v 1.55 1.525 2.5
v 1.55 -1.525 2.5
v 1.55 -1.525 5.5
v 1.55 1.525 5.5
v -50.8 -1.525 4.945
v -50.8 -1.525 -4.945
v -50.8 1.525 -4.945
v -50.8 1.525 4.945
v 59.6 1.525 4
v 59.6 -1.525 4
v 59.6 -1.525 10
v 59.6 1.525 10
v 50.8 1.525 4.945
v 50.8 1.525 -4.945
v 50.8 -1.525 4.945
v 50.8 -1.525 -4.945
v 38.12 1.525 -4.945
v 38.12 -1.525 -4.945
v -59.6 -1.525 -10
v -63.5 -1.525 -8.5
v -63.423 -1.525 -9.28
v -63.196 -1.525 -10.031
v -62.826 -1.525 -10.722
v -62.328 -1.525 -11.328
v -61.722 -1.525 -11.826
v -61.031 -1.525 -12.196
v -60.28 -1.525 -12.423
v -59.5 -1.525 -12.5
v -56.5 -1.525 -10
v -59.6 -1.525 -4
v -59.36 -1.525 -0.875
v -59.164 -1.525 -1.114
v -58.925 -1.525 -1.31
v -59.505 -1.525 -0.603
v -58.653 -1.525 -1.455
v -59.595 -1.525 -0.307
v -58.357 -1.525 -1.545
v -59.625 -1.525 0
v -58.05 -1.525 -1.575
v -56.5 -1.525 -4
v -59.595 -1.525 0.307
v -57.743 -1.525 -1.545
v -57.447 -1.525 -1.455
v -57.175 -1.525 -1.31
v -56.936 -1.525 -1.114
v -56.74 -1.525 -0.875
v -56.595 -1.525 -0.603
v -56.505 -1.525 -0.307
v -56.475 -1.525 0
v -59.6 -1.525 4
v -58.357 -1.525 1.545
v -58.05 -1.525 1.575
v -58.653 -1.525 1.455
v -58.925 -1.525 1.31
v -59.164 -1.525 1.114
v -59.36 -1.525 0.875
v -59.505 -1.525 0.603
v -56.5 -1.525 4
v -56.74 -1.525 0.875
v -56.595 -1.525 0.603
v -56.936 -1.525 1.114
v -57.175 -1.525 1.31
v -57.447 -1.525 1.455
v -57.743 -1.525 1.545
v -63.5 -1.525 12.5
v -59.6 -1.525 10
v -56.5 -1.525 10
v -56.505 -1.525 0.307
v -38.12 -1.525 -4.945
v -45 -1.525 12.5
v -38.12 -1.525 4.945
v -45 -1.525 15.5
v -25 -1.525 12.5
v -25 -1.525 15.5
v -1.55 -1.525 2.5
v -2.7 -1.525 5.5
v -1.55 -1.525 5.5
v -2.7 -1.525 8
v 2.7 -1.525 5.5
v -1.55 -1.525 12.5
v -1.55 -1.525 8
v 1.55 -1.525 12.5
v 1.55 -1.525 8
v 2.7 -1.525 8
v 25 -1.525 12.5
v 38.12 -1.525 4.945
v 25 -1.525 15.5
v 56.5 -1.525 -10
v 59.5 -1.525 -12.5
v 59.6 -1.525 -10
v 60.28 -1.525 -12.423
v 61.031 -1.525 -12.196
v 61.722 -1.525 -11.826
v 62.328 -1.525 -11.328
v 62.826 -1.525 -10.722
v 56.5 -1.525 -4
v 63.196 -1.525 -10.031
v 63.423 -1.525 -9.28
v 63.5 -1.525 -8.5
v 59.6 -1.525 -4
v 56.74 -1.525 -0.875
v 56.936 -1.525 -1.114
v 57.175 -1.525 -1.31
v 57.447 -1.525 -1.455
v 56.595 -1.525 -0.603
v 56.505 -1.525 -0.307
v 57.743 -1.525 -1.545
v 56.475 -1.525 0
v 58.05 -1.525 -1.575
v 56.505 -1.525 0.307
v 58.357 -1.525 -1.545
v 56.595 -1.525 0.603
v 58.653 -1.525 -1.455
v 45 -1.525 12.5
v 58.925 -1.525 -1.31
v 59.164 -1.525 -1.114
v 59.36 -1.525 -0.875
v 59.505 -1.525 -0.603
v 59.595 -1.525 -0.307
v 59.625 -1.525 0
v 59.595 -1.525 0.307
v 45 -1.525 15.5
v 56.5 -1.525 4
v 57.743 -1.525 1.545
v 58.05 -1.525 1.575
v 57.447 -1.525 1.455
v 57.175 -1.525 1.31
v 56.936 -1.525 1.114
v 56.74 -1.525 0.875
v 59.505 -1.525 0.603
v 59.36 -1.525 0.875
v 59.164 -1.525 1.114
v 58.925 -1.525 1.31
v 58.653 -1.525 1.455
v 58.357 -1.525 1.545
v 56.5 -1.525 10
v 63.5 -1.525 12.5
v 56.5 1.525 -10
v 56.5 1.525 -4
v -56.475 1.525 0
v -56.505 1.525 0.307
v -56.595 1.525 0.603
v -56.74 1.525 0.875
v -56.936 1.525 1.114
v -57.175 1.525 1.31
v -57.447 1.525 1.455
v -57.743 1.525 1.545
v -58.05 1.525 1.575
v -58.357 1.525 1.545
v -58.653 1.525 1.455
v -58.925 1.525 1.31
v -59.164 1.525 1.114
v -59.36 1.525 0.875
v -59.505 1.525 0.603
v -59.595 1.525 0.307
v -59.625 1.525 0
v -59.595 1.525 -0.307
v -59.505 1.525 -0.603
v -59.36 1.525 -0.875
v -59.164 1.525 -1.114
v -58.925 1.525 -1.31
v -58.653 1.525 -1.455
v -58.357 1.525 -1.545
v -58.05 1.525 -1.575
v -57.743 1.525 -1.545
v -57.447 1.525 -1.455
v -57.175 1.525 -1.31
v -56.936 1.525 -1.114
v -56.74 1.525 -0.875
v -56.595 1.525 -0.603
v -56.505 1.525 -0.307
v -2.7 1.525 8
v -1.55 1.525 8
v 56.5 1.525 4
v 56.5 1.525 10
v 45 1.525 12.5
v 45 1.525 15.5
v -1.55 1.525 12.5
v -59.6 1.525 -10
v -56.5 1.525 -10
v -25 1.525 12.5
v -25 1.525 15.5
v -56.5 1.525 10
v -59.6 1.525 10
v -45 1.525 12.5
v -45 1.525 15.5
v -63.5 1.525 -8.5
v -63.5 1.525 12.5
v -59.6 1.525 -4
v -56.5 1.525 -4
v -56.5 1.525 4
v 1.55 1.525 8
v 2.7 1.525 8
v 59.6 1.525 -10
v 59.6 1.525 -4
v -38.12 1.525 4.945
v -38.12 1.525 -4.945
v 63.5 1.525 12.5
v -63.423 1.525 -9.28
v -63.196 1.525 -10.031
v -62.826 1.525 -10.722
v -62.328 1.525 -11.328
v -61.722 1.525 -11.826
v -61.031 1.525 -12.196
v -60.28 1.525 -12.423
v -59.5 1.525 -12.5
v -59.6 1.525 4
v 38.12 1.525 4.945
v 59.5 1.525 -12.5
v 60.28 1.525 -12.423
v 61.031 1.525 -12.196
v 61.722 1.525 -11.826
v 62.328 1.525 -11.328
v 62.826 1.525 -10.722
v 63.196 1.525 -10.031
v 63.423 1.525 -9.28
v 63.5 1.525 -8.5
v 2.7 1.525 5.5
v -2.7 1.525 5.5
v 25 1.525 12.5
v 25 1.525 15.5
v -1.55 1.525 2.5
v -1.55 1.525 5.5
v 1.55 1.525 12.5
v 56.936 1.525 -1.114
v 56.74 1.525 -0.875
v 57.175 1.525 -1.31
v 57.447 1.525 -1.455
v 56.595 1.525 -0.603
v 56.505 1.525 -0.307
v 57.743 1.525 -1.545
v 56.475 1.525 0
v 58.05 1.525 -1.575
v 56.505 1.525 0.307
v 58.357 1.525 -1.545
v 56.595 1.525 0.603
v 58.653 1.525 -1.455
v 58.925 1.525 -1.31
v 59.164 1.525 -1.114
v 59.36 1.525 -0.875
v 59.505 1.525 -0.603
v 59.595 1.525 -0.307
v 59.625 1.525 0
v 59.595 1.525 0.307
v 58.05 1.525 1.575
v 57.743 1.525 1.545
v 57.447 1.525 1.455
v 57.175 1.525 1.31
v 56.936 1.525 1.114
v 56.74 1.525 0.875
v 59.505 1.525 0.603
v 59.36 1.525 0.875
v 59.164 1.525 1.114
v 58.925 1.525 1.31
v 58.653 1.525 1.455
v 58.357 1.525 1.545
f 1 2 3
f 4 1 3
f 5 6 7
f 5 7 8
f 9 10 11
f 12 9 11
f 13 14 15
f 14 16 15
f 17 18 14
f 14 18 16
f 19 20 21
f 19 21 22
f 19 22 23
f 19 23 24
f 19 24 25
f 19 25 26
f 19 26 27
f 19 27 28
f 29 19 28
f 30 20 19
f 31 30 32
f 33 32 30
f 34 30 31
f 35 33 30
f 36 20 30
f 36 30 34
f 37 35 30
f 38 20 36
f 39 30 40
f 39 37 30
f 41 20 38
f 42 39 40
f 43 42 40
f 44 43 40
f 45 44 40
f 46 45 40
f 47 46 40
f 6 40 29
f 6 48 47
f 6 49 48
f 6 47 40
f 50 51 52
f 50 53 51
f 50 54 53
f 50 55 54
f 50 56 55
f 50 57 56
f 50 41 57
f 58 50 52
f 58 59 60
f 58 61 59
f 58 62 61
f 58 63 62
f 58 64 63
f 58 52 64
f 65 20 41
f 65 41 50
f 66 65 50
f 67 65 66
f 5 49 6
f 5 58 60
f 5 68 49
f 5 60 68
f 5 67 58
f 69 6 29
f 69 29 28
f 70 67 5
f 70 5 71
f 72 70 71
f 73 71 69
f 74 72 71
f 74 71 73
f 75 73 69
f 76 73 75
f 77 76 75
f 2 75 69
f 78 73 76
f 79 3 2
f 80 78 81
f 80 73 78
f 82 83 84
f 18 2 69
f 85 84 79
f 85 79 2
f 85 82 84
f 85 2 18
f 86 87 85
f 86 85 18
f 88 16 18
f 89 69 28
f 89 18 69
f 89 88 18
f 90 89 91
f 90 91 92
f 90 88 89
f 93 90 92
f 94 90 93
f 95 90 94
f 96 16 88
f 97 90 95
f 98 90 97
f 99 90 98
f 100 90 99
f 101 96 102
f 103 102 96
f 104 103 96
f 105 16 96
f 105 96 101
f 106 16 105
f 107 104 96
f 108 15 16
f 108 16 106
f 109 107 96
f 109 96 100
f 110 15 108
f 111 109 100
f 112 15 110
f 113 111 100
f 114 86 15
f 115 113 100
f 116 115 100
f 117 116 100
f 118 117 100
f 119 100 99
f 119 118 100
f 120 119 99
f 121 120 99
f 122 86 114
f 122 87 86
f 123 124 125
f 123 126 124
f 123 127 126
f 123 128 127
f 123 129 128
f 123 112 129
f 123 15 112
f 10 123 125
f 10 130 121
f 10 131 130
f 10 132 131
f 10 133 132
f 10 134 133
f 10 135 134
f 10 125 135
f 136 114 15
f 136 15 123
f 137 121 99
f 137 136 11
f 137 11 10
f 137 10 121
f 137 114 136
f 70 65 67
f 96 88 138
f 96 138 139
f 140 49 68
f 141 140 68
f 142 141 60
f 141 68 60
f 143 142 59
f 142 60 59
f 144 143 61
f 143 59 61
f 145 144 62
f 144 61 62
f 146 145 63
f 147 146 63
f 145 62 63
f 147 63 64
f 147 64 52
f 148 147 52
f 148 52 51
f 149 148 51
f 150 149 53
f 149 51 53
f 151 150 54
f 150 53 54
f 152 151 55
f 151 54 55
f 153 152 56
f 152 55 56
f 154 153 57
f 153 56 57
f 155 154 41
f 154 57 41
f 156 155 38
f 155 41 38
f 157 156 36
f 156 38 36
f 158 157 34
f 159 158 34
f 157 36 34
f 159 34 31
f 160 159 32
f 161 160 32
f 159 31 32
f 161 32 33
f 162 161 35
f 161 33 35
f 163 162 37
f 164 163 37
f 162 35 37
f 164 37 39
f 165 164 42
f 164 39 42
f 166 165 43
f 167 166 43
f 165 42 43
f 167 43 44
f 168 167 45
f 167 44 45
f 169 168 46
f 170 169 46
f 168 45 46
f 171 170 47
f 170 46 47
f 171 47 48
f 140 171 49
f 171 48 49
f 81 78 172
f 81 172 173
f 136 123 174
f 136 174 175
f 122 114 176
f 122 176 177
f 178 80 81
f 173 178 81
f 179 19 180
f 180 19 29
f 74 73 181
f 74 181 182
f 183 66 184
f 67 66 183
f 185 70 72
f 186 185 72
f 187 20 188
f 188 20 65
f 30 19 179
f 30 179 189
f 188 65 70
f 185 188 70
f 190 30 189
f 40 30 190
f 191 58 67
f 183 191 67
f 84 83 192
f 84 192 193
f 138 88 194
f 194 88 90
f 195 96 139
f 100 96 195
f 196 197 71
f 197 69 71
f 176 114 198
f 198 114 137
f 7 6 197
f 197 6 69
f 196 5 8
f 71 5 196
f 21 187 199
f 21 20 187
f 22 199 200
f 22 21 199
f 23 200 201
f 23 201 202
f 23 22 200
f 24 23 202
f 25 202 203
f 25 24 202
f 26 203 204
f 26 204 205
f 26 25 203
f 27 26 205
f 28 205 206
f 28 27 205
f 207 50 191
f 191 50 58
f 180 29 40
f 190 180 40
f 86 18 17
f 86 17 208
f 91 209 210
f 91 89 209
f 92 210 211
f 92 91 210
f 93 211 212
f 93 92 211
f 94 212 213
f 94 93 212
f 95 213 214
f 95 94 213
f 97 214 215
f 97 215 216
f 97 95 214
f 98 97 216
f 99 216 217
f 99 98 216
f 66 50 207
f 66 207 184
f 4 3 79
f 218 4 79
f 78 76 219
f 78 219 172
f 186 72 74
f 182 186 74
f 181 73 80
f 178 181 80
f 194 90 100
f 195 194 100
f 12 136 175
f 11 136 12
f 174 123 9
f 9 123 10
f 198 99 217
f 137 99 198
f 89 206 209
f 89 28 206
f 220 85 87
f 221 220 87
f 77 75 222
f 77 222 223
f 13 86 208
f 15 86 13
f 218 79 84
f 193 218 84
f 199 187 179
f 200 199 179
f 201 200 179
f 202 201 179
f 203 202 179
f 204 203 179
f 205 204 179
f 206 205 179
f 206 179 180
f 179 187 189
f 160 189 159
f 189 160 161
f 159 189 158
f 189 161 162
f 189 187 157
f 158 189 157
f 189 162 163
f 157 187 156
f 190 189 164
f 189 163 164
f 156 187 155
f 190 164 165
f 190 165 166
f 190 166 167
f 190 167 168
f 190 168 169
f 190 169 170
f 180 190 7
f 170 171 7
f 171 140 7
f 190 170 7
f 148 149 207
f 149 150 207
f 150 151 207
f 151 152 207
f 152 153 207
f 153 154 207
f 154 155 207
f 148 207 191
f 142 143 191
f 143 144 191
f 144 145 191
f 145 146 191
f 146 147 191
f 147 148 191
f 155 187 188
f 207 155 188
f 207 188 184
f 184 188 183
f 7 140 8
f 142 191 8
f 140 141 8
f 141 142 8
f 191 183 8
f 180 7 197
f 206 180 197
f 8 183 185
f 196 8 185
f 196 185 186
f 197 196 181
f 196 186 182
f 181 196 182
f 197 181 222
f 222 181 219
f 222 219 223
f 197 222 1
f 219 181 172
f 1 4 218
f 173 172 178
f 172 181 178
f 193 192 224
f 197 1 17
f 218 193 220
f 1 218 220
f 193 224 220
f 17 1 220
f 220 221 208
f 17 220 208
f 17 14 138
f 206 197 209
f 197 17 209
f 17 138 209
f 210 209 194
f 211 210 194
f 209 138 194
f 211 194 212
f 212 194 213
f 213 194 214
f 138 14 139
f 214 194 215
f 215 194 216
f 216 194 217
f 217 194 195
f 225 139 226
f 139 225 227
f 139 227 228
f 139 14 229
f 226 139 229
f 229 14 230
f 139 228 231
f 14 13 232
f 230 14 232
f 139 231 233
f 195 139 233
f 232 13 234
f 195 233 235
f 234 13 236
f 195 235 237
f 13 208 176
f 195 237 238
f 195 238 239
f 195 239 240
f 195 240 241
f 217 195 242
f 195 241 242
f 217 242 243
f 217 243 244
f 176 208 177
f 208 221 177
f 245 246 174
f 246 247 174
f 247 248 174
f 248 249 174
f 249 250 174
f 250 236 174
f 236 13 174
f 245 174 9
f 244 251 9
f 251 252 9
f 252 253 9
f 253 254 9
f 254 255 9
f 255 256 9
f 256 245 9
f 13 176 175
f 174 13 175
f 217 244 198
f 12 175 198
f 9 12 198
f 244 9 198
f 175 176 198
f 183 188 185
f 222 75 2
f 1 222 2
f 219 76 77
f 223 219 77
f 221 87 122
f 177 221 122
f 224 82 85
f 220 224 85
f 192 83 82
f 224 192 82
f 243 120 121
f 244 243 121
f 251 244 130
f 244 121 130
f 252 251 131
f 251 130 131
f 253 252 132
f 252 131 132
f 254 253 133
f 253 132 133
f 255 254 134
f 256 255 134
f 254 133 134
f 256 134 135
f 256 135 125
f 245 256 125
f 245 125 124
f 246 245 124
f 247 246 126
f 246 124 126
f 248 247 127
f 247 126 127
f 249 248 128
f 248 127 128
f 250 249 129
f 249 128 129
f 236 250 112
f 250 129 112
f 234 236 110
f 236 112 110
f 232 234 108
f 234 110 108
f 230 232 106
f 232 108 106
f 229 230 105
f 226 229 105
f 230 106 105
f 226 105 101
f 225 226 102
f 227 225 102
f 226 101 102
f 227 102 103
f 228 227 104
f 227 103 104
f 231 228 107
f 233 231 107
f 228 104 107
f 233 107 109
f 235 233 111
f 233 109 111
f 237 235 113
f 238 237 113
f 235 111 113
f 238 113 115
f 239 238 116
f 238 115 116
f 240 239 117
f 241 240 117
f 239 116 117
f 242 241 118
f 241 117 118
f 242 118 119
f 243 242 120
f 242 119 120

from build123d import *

# Parameters (mm, degrees)
F0_W     = 127
F0_H     = 25
F0_W_2   = 12.68
F0_H_2   = 9.89
F1_DEPTH = 1.525
F2_W     = 20
F2_H     = 3
F3_DEPTH = 3.05
F4_W     = 3.1
F4_H     = 4.5
F4_H_2   = 2.5
F4_W_2   = 1.15
F4_H_3   = 3
F5_DEPTH = 3.05
F6_W     = 3.1
F6_H     = 6
F6_R     = 1.575
F7_DEPTH = 3.05
F8_R     = 4


with BuildPart() as f1:
    # F0 (on Front) → F1 (new body, symmetric)
    with BuildSketch(Plane.XZ):
        Rectangle(F0_W, F0_H)
        with Locations((-44.46, 0)):
            Rectangle(F0_W_2, F0_H_2, mode=Mode.SUBTRACT)
        with Locations((44.46, 0)):
            Rectangle(F0_W_2, F0_H_2, mode=Mode.SUBTRACT)
    extrude(amount=F1_DEPTH, both=True)

    # F2 (on face) → F3 (join, through all)
    with BuildSketch(Plane.XZ.offset(1.525)):
        with Locations((-35, 14)):
            Rectangle(F2_W, F2_H)
        with Locations((35, 14)):
            Rectangle(F2_W, F2_H)
    extrude(amount=-F3_DEPTH)

    # F4 (on face) → F5 (cut, through all)
    with BuildSketch(Plane.XZ.offset(1.525)):
        with Locations((0, 10.25)):
            Rectangle(F4_W, F4_H)
        with Locations((0, 6.75)):
            Rectangle(F4_W, F4_H_2)
        with Locations((-2.125, 6.75)):
            Rectangle(F4_W_2, F4_H_2)
        with Locations((2.125, 6.75)):
            Rectangle(F4_W_2, F4_H_2)
        with Locations((0, 4)):
            Rectangle(F4_W, F4_H_3)
    extrude(amount=-F5_DEPTH, mode=Mode.SUBTRACT)

    # F6 (on face) → F7 (cut, through all)
    with BuildSketch(Plane.XZ.offset(1.525)):
        with Locations((-58.05, 7)):
            Rectangle(F6_W, F6_H)
        with Locations((-58.05, -7)):
            Rectangle(F6_W, F6_H)
        with Locations((-58.05, 0)):
            Circle(F6_R)
        with Locations((58.05, 7)):
            Rectangle(F6_W, F6_H)
        with Locations((58.05, -7)):
            Rectangle(F6_W, F6_H)
        with Locations((58.05, 0)):
            Circle(F6_R)
    extrude(amount=-F7_DEPTH, mode=Mode.SUBTRACT)

    # F8
    f8_edges = [f1.edges().sort_by_distance(p)[0] for p in [
        (-63.5, 0, -12.5),
        (63.5, 0, -12.5),
    ]]
    fillet(f8_edges, radius=F8_R)


solid = f1.part
